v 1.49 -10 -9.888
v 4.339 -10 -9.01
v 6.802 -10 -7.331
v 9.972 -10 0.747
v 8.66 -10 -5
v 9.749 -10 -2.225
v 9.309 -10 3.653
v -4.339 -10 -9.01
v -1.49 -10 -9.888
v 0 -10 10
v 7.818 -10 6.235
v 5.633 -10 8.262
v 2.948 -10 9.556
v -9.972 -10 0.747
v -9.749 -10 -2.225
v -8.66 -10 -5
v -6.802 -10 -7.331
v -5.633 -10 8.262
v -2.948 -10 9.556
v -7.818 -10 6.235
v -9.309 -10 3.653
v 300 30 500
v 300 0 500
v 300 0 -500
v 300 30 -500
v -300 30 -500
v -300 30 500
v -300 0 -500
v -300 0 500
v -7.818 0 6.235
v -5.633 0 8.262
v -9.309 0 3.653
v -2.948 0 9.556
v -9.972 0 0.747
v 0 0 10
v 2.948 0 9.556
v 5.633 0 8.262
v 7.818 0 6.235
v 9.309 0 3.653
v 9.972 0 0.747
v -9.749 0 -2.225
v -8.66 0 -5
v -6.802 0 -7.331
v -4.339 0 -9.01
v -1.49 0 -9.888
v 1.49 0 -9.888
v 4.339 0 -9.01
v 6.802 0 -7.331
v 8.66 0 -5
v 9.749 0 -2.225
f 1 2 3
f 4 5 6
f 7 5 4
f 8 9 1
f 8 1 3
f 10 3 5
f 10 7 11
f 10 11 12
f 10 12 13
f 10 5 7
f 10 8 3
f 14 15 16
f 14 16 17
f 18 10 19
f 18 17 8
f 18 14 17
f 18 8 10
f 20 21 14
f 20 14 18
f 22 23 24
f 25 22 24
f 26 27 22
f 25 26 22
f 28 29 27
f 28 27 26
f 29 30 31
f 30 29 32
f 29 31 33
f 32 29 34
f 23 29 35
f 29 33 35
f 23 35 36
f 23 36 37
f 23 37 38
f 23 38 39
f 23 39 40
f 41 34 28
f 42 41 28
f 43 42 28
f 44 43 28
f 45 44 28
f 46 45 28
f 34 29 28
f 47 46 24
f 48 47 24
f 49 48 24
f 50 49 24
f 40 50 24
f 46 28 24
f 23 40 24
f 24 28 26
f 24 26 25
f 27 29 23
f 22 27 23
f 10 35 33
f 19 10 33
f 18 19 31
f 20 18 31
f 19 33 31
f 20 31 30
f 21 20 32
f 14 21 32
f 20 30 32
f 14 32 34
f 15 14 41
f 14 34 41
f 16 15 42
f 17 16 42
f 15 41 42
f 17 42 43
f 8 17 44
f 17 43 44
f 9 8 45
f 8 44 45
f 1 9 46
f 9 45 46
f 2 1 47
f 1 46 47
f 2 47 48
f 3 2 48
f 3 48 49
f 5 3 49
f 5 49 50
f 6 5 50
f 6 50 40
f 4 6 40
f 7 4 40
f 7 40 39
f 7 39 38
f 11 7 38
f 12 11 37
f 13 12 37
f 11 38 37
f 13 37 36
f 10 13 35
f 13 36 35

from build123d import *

# Parameters (mm, degrees)
SKETCH8_W            = 600
SKETCH8_H            = 1000
BOSS_EXTRUDE9_DEPTH  = 30
SKETCH11_R           = 10
SKETCH11_R_2         = 5
BOSS_EXTRUDE12_DEPTH = 10
SKETCH12_R           = 10
BOSS_EXTRUDE13_DEPTH = 10


with BuildPart() as part:
    # Sketch8 → Boss-Extrude9 (new body)
    with BuildSketch(Plane(origin=(0, 0, 0), x_dir=(1, 0, 0), z_dir=(0, 1, 0))):
        Rectangle(SKETCH8_W, SKETCH8_H)
    extrude(amount=BOSS_EXTRUDE9_DEPTH)

    # Sketch11 → Boss-Extrude12 (add)
    with BuildSketch(Plane(origin=(0, 0, 0), x_dir=(1, 0, 0), z_dir=(0, 1, 0))):
        Circle(SKETCH11_R)
        Circle(SKETCH11_R_2, mode=Mode.SUBTRACT)
    extrude(amount=BOSS_EXTRUDE12_DEPTH)

    # Sketch12 → Boss-Extrude13 (add)
    with BuildSketch(Plane(origin=(0, 0, 0), x_dir=(-1, 0, 0), z_dir=(0, -1, 0))):
        with Locations(Location((0, 0, 0), (0, 0, 270))):
            Circle(SKETCH12_R)
    extrude(amount=BOSS_EXTRUDE13_DEPTH)


solid = part.part
